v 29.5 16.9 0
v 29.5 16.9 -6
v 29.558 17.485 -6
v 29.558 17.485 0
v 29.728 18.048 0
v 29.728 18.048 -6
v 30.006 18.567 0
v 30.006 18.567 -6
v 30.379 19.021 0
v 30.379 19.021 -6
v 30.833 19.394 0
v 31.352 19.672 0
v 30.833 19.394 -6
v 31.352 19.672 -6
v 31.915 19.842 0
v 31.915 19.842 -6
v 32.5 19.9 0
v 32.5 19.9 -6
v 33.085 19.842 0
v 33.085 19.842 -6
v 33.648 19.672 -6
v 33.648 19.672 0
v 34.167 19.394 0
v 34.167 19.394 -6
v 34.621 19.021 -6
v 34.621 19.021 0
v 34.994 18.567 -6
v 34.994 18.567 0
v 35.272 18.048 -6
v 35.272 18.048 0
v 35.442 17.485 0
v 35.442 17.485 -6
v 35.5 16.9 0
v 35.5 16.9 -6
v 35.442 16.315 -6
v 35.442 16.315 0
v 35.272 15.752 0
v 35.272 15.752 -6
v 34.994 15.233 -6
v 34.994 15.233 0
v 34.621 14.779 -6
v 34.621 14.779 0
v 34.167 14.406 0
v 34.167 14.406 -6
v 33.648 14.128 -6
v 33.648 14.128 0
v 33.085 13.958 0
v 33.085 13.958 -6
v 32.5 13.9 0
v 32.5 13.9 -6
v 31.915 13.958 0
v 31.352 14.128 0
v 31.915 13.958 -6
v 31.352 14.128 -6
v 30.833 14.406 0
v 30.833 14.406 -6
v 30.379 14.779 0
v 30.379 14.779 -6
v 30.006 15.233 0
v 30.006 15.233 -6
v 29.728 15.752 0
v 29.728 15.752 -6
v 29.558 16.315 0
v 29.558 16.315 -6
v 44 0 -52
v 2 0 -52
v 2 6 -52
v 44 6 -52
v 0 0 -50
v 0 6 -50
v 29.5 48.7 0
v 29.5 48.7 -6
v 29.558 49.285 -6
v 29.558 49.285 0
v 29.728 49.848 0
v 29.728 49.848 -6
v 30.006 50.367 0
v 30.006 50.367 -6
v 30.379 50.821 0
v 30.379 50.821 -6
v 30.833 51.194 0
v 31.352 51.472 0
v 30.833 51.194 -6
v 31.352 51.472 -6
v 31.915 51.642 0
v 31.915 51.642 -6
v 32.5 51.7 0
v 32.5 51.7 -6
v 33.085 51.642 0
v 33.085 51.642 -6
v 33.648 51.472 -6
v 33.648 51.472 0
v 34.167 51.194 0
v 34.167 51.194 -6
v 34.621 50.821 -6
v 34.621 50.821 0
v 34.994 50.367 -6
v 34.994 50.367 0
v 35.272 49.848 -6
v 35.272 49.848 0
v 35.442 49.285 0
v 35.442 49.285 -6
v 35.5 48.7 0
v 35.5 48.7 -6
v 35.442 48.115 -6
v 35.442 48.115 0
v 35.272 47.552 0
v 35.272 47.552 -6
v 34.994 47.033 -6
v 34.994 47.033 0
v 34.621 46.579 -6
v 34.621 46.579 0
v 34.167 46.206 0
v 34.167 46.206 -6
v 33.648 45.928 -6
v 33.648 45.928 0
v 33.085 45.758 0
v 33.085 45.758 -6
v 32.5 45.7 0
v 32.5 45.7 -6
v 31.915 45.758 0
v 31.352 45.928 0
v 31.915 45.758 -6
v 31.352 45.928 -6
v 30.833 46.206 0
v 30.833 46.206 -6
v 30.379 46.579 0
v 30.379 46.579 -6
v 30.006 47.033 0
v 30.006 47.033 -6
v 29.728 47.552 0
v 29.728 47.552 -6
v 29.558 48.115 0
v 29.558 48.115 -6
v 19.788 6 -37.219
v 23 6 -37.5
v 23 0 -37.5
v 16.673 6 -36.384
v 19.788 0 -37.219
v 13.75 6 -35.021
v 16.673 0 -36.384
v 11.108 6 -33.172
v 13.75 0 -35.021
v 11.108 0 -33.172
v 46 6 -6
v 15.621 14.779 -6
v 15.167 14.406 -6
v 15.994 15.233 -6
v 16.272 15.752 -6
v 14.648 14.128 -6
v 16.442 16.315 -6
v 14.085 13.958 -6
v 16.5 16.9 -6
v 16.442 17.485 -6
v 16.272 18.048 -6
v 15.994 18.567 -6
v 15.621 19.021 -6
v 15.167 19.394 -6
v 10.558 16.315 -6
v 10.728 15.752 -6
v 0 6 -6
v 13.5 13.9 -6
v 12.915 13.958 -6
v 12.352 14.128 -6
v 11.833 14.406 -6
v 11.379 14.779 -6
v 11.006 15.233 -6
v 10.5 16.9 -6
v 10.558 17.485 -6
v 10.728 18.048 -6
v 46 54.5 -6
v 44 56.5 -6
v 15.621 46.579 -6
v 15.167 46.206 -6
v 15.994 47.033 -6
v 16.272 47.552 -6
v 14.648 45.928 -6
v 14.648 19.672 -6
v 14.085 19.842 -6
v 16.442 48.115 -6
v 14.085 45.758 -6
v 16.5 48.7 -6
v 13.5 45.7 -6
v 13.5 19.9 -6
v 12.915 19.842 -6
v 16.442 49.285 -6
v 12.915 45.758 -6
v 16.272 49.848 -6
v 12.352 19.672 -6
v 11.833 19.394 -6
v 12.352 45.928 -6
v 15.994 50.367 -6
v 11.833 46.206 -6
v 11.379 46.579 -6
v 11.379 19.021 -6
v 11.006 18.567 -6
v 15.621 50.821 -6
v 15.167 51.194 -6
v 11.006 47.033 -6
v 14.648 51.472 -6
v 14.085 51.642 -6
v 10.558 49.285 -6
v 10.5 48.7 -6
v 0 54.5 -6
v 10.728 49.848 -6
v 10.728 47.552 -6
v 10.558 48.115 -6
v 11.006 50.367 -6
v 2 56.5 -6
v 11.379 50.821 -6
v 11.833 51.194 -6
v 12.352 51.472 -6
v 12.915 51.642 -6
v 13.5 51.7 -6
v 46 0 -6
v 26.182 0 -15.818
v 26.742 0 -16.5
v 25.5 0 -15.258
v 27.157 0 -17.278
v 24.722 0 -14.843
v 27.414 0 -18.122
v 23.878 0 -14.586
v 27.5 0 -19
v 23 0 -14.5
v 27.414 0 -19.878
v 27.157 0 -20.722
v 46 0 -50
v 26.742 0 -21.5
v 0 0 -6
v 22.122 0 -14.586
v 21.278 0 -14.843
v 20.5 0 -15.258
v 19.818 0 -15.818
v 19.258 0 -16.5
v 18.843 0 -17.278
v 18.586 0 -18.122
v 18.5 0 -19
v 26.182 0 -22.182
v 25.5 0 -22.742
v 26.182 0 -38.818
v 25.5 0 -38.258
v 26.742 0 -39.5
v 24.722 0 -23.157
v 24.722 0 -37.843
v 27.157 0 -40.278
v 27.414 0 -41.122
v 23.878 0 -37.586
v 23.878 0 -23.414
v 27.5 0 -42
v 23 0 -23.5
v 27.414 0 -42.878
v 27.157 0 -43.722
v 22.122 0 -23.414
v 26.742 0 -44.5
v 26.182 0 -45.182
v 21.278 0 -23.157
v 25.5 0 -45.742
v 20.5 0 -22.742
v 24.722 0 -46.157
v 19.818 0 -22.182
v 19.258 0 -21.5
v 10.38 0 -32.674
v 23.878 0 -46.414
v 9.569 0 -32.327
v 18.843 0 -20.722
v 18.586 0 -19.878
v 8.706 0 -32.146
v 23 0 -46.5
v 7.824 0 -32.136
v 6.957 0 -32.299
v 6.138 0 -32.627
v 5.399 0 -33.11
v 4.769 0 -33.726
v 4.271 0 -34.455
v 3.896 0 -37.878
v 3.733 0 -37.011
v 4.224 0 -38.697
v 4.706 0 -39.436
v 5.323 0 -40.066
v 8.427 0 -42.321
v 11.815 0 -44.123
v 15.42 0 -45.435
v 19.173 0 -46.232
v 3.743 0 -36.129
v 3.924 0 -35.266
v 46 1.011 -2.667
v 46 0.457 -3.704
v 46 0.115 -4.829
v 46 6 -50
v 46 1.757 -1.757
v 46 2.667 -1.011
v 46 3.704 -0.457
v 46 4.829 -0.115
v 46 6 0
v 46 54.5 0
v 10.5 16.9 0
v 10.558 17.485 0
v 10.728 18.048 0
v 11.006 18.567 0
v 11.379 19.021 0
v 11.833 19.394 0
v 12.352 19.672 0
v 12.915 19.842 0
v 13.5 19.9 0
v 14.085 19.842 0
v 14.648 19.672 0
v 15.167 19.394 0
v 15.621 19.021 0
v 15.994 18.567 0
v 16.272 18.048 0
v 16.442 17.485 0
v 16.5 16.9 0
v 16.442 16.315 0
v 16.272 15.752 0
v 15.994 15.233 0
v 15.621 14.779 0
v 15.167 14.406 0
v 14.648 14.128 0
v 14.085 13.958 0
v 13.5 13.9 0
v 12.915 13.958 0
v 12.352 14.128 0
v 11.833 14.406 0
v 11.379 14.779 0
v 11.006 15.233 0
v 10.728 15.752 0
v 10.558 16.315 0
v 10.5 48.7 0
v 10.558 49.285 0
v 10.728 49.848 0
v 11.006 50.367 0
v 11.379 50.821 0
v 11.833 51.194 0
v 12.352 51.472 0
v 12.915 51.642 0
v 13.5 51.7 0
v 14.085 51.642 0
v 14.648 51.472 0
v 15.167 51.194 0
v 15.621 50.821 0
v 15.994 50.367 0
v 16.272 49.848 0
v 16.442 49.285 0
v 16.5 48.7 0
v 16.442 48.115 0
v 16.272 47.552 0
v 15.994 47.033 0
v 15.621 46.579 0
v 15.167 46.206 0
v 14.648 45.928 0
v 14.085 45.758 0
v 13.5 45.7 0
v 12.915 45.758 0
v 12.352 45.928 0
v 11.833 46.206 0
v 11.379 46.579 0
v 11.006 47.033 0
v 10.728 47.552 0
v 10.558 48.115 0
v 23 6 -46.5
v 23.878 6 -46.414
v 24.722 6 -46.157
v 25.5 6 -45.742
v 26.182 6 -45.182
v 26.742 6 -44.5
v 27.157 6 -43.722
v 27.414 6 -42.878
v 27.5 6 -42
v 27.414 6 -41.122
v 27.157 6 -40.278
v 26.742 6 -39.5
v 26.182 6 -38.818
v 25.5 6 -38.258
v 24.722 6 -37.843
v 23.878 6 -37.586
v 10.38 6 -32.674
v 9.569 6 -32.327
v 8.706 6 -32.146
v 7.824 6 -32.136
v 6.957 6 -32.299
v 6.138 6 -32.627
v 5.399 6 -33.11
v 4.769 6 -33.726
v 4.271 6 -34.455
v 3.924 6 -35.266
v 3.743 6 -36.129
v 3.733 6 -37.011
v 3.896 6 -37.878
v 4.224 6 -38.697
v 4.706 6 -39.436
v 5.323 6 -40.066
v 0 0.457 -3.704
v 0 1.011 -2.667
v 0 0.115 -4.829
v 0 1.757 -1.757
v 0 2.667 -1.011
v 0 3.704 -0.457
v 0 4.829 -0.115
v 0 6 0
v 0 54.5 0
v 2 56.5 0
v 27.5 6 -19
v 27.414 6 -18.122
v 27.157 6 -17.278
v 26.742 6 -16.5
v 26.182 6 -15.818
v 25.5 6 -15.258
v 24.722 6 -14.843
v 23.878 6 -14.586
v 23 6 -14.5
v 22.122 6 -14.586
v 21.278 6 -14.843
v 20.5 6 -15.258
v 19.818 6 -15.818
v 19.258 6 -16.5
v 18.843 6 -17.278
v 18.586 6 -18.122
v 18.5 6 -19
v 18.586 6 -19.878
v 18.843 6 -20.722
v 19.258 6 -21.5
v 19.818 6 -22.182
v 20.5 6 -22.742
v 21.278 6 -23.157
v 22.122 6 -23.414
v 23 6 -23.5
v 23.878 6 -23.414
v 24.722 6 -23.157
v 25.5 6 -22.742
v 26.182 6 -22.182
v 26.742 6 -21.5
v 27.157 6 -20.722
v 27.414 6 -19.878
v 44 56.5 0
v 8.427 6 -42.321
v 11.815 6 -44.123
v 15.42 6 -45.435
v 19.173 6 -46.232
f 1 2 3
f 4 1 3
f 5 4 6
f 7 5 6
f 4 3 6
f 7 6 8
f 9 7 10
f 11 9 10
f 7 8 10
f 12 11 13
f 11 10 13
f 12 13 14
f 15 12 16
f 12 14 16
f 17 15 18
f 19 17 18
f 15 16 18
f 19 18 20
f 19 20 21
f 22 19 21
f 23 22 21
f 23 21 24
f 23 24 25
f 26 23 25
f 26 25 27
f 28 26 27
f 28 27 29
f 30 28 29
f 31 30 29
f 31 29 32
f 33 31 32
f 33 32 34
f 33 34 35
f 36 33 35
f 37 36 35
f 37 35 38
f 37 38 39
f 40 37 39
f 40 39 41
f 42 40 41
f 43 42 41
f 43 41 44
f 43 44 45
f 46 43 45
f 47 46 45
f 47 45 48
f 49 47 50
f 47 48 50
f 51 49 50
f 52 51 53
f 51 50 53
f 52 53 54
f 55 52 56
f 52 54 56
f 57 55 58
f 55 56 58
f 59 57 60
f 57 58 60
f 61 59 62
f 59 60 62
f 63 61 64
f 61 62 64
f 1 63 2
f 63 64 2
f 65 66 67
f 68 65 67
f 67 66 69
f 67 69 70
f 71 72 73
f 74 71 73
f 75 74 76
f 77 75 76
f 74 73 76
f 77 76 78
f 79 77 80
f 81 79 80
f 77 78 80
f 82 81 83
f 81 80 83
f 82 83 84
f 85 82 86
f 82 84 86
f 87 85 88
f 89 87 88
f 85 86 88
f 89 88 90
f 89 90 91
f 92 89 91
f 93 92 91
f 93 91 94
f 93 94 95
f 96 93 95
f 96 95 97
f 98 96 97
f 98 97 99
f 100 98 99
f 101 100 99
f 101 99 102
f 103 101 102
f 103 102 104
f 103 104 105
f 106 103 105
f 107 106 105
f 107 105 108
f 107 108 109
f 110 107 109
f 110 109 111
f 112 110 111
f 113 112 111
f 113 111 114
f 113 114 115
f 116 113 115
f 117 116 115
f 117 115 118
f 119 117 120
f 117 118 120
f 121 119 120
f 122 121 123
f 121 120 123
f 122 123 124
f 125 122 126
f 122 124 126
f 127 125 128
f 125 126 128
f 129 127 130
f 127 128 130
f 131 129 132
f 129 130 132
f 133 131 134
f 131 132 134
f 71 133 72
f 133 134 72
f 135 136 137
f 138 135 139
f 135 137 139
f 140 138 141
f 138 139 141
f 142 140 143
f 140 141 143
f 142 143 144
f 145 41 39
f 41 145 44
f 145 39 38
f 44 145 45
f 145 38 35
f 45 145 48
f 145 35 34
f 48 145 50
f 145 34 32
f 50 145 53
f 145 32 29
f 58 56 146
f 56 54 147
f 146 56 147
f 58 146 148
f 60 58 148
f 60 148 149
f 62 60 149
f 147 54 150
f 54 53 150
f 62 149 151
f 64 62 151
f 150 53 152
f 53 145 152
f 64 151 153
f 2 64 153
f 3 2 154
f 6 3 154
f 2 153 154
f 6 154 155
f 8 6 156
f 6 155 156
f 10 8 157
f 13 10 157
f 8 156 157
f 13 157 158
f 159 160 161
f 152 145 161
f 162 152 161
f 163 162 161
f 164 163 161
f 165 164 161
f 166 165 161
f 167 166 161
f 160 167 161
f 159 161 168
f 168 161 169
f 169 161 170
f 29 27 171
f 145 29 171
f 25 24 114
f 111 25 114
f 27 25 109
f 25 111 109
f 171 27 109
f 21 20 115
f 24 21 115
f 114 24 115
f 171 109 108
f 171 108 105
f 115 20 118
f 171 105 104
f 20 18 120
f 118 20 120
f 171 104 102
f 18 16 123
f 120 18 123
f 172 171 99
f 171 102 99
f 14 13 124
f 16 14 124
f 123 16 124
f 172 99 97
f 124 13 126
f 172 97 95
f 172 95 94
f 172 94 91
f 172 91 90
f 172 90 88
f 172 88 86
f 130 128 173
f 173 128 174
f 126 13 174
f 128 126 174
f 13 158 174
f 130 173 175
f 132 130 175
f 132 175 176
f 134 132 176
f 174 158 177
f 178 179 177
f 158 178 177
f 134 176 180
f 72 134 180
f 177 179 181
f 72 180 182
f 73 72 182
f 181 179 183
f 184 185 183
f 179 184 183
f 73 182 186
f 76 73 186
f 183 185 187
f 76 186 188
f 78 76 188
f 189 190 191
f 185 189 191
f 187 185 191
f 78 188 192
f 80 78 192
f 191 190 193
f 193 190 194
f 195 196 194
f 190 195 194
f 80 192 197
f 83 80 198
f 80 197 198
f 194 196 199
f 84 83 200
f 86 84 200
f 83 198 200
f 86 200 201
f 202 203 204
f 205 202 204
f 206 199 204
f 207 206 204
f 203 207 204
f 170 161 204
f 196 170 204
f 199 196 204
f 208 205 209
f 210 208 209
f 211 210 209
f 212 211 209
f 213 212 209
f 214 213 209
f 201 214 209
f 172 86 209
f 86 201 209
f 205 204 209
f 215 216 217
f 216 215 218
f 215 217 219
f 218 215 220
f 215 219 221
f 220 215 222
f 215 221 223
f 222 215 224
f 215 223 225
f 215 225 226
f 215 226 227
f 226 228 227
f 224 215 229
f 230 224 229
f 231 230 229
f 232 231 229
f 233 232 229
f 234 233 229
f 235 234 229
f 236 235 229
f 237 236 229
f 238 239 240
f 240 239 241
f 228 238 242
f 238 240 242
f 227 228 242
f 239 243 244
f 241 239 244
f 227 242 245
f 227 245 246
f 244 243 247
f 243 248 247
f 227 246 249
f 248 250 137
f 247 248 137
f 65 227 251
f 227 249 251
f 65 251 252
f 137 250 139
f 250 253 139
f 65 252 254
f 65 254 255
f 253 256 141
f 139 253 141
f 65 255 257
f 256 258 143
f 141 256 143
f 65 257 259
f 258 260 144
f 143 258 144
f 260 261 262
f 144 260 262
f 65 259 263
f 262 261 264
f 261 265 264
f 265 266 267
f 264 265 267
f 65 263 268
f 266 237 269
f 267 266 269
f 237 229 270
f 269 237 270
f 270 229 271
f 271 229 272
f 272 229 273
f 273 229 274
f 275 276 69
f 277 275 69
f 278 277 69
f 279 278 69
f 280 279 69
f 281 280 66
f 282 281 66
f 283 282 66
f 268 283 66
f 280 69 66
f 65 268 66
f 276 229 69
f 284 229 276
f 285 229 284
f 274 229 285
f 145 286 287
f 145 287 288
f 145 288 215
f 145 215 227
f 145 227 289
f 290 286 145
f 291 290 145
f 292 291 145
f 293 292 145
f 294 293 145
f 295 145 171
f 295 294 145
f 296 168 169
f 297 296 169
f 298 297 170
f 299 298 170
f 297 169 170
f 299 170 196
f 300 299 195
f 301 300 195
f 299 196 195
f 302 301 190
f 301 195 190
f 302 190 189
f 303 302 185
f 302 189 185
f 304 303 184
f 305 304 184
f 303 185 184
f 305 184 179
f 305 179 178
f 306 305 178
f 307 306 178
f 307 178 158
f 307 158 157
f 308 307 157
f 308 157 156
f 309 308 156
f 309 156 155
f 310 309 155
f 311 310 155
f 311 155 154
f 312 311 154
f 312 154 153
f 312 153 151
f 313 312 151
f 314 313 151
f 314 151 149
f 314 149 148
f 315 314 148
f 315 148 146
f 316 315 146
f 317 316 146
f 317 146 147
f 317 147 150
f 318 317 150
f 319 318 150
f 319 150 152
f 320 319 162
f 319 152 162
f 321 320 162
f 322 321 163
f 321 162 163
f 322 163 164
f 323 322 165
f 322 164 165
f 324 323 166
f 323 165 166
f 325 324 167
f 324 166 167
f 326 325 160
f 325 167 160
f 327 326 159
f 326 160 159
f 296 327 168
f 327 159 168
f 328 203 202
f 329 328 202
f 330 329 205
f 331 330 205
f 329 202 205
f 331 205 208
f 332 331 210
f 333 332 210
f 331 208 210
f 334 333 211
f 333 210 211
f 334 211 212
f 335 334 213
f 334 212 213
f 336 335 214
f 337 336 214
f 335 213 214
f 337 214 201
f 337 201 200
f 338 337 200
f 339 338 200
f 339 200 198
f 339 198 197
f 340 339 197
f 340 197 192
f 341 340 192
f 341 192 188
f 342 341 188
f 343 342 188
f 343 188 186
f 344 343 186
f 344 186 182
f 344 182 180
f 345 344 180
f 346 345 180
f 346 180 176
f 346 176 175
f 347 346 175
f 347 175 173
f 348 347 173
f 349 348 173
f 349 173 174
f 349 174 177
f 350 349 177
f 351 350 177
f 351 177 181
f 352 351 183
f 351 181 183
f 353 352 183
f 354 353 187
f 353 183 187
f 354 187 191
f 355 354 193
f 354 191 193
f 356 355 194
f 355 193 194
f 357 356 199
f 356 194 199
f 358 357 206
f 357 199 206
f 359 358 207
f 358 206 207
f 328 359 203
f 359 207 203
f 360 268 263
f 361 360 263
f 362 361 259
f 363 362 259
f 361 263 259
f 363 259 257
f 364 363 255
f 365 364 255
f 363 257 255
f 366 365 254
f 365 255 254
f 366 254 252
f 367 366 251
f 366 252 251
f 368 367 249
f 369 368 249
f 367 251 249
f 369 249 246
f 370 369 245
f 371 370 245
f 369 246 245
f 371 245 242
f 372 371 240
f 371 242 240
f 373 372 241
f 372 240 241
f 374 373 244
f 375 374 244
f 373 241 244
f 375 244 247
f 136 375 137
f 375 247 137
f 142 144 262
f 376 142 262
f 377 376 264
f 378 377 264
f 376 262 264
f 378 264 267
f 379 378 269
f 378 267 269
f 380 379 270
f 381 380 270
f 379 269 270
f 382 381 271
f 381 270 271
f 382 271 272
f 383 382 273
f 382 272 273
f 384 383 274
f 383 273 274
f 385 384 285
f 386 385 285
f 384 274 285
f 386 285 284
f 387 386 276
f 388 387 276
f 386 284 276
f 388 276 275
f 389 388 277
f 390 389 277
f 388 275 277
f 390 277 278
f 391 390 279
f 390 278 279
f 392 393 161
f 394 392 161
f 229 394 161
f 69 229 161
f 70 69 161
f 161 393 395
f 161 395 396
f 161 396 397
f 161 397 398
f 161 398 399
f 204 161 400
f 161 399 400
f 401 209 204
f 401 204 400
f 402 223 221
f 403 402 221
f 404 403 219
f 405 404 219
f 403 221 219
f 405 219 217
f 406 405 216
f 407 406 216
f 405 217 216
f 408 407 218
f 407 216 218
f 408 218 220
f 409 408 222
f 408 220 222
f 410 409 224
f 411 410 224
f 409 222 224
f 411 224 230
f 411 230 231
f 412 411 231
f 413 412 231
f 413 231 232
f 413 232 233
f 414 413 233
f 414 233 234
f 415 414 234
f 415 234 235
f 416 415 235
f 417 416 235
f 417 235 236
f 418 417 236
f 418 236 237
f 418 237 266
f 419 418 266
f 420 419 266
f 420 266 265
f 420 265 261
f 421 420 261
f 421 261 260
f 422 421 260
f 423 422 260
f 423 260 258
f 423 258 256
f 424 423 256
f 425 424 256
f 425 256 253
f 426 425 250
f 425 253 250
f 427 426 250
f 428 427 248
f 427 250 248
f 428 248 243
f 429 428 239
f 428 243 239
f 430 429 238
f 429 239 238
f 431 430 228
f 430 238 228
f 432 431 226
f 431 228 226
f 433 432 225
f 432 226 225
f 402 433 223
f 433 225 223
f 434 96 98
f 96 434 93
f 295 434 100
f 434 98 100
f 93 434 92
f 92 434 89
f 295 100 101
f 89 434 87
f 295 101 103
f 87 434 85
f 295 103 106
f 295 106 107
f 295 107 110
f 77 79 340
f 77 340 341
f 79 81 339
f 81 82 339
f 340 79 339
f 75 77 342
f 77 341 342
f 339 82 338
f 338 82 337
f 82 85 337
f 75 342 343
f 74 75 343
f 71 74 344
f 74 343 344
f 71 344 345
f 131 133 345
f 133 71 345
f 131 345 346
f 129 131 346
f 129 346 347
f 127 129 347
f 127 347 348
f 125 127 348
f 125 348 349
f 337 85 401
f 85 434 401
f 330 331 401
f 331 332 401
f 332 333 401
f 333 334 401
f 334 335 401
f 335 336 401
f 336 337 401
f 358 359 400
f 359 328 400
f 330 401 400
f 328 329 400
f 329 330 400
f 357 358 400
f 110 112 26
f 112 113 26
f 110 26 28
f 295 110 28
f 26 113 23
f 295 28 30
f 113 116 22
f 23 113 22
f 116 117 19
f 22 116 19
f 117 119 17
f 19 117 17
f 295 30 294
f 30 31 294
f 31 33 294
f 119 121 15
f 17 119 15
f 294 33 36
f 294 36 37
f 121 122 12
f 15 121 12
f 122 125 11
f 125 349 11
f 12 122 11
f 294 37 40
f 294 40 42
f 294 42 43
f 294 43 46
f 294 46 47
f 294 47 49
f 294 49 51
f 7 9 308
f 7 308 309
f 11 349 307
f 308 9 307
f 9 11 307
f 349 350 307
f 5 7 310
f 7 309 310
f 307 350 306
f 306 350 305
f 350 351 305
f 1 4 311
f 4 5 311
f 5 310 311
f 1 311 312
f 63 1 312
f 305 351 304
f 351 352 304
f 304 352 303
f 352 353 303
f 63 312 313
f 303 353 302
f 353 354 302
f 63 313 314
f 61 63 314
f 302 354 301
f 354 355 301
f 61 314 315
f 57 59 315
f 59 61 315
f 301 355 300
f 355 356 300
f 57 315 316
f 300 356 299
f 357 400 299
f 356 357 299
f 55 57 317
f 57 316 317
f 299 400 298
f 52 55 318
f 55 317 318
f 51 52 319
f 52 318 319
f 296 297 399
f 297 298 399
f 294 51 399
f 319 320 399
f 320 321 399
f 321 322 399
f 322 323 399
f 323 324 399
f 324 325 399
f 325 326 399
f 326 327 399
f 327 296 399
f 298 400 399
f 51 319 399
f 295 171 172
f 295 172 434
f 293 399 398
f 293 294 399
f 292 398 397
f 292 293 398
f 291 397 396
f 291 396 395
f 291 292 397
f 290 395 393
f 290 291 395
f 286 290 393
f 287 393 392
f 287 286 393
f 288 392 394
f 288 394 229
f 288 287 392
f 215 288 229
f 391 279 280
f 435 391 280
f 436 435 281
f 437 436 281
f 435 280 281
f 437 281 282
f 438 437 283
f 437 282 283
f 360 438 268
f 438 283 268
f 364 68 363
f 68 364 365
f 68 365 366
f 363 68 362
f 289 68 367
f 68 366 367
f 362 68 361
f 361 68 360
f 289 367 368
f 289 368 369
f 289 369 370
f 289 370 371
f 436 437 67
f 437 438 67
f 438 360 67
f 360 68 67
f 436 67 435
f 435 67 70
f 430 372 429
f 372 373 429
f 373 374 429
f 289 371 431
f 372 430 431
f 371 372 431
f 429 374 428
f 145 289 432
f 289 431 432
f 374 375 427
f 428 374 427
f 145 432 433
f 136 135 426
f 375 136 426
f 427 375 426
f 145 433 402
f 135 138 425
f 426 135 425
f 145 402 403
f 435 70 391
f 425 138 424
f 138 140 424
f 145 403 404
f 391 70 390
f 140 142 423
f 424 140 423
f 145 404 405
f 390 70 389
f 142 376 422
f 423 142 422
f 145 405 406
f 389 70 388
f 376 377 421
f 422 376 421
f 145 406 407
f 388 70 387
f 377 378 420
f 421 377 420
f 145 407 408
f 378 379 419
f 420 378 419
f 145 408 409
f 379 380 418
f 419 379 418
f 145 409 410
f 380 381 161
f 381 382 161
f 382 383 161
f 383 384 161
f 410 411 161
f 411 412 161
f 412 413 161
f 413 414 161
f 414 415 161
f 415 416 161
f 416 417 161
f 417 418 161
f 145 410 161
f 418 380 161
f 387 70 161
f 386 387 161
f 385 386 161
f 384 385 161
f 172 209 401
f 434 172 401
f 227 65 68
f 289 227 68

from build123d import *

# Parameters (mm, degrees)
F1_DEPTH = 46
F3_D     = 6
F5_R     = 6
F6_SIZE  = 2
F4_R     = 4.5
F7_DEPTH = 25


with BuildPart() as f1:
    # F0 (on Right) → F1 (new body)
    with BuildSketch(Plane.YZ):
        Polygon((56.5, 0), (0, 0), (0, -52), (6, -52), (6, -6), (56.5, -6), align=None)
    extrude(amount=F1_DEPTH)

    # F3 (through all)
    with Locations(Plane.XY):
        with Locations((13.5, 16.9), (32.5, 16.9), (32.5, 48.7), (13.5, 48.7)):
            Hole(F3_D / 2)

    # F5
    f5_edges = [f1.edges().sort_by_distance(p)[0] for p in [
        (23, 0, 0),
    ]]
    fillet(f5_edges, radius=F5_R)

    # F6
    f6_edges = [f1.edges().sort_by_distance(p)[0] for p in [
        (46, 56.5, -3),
        (0, 56.5, -3),
        (0, 3, -52),
        (46, 3, -52),
    ]]
    chamfer(f6_edges, length=F6_SIZE)

    # F4 (on face) → F7 (cut)
    with BuildSketch(Plane.XZ):
        with Locations((23, -19)):
            Circle(F4_R)
        with BuildLine():
            ThreePointArc((23, -37.5), (16.672627, -36.384313), (11.108429, -33.171822))
            ThreePointArc((11.108429, -33.171822), (4.768685, -33.726478), (5.323341, -40.066222))
            ThreePointArc((5.323341, -40.066222), (13.594446, -44.841547), (23, -46.5))
            ThreePointArc((23, -46.5), (27.5, -42), (23, -37.5))
        make_face()
    extrude(amount=-F7_DEPTH, mode=Mode.SUBTRACT)


solid = f1.part
